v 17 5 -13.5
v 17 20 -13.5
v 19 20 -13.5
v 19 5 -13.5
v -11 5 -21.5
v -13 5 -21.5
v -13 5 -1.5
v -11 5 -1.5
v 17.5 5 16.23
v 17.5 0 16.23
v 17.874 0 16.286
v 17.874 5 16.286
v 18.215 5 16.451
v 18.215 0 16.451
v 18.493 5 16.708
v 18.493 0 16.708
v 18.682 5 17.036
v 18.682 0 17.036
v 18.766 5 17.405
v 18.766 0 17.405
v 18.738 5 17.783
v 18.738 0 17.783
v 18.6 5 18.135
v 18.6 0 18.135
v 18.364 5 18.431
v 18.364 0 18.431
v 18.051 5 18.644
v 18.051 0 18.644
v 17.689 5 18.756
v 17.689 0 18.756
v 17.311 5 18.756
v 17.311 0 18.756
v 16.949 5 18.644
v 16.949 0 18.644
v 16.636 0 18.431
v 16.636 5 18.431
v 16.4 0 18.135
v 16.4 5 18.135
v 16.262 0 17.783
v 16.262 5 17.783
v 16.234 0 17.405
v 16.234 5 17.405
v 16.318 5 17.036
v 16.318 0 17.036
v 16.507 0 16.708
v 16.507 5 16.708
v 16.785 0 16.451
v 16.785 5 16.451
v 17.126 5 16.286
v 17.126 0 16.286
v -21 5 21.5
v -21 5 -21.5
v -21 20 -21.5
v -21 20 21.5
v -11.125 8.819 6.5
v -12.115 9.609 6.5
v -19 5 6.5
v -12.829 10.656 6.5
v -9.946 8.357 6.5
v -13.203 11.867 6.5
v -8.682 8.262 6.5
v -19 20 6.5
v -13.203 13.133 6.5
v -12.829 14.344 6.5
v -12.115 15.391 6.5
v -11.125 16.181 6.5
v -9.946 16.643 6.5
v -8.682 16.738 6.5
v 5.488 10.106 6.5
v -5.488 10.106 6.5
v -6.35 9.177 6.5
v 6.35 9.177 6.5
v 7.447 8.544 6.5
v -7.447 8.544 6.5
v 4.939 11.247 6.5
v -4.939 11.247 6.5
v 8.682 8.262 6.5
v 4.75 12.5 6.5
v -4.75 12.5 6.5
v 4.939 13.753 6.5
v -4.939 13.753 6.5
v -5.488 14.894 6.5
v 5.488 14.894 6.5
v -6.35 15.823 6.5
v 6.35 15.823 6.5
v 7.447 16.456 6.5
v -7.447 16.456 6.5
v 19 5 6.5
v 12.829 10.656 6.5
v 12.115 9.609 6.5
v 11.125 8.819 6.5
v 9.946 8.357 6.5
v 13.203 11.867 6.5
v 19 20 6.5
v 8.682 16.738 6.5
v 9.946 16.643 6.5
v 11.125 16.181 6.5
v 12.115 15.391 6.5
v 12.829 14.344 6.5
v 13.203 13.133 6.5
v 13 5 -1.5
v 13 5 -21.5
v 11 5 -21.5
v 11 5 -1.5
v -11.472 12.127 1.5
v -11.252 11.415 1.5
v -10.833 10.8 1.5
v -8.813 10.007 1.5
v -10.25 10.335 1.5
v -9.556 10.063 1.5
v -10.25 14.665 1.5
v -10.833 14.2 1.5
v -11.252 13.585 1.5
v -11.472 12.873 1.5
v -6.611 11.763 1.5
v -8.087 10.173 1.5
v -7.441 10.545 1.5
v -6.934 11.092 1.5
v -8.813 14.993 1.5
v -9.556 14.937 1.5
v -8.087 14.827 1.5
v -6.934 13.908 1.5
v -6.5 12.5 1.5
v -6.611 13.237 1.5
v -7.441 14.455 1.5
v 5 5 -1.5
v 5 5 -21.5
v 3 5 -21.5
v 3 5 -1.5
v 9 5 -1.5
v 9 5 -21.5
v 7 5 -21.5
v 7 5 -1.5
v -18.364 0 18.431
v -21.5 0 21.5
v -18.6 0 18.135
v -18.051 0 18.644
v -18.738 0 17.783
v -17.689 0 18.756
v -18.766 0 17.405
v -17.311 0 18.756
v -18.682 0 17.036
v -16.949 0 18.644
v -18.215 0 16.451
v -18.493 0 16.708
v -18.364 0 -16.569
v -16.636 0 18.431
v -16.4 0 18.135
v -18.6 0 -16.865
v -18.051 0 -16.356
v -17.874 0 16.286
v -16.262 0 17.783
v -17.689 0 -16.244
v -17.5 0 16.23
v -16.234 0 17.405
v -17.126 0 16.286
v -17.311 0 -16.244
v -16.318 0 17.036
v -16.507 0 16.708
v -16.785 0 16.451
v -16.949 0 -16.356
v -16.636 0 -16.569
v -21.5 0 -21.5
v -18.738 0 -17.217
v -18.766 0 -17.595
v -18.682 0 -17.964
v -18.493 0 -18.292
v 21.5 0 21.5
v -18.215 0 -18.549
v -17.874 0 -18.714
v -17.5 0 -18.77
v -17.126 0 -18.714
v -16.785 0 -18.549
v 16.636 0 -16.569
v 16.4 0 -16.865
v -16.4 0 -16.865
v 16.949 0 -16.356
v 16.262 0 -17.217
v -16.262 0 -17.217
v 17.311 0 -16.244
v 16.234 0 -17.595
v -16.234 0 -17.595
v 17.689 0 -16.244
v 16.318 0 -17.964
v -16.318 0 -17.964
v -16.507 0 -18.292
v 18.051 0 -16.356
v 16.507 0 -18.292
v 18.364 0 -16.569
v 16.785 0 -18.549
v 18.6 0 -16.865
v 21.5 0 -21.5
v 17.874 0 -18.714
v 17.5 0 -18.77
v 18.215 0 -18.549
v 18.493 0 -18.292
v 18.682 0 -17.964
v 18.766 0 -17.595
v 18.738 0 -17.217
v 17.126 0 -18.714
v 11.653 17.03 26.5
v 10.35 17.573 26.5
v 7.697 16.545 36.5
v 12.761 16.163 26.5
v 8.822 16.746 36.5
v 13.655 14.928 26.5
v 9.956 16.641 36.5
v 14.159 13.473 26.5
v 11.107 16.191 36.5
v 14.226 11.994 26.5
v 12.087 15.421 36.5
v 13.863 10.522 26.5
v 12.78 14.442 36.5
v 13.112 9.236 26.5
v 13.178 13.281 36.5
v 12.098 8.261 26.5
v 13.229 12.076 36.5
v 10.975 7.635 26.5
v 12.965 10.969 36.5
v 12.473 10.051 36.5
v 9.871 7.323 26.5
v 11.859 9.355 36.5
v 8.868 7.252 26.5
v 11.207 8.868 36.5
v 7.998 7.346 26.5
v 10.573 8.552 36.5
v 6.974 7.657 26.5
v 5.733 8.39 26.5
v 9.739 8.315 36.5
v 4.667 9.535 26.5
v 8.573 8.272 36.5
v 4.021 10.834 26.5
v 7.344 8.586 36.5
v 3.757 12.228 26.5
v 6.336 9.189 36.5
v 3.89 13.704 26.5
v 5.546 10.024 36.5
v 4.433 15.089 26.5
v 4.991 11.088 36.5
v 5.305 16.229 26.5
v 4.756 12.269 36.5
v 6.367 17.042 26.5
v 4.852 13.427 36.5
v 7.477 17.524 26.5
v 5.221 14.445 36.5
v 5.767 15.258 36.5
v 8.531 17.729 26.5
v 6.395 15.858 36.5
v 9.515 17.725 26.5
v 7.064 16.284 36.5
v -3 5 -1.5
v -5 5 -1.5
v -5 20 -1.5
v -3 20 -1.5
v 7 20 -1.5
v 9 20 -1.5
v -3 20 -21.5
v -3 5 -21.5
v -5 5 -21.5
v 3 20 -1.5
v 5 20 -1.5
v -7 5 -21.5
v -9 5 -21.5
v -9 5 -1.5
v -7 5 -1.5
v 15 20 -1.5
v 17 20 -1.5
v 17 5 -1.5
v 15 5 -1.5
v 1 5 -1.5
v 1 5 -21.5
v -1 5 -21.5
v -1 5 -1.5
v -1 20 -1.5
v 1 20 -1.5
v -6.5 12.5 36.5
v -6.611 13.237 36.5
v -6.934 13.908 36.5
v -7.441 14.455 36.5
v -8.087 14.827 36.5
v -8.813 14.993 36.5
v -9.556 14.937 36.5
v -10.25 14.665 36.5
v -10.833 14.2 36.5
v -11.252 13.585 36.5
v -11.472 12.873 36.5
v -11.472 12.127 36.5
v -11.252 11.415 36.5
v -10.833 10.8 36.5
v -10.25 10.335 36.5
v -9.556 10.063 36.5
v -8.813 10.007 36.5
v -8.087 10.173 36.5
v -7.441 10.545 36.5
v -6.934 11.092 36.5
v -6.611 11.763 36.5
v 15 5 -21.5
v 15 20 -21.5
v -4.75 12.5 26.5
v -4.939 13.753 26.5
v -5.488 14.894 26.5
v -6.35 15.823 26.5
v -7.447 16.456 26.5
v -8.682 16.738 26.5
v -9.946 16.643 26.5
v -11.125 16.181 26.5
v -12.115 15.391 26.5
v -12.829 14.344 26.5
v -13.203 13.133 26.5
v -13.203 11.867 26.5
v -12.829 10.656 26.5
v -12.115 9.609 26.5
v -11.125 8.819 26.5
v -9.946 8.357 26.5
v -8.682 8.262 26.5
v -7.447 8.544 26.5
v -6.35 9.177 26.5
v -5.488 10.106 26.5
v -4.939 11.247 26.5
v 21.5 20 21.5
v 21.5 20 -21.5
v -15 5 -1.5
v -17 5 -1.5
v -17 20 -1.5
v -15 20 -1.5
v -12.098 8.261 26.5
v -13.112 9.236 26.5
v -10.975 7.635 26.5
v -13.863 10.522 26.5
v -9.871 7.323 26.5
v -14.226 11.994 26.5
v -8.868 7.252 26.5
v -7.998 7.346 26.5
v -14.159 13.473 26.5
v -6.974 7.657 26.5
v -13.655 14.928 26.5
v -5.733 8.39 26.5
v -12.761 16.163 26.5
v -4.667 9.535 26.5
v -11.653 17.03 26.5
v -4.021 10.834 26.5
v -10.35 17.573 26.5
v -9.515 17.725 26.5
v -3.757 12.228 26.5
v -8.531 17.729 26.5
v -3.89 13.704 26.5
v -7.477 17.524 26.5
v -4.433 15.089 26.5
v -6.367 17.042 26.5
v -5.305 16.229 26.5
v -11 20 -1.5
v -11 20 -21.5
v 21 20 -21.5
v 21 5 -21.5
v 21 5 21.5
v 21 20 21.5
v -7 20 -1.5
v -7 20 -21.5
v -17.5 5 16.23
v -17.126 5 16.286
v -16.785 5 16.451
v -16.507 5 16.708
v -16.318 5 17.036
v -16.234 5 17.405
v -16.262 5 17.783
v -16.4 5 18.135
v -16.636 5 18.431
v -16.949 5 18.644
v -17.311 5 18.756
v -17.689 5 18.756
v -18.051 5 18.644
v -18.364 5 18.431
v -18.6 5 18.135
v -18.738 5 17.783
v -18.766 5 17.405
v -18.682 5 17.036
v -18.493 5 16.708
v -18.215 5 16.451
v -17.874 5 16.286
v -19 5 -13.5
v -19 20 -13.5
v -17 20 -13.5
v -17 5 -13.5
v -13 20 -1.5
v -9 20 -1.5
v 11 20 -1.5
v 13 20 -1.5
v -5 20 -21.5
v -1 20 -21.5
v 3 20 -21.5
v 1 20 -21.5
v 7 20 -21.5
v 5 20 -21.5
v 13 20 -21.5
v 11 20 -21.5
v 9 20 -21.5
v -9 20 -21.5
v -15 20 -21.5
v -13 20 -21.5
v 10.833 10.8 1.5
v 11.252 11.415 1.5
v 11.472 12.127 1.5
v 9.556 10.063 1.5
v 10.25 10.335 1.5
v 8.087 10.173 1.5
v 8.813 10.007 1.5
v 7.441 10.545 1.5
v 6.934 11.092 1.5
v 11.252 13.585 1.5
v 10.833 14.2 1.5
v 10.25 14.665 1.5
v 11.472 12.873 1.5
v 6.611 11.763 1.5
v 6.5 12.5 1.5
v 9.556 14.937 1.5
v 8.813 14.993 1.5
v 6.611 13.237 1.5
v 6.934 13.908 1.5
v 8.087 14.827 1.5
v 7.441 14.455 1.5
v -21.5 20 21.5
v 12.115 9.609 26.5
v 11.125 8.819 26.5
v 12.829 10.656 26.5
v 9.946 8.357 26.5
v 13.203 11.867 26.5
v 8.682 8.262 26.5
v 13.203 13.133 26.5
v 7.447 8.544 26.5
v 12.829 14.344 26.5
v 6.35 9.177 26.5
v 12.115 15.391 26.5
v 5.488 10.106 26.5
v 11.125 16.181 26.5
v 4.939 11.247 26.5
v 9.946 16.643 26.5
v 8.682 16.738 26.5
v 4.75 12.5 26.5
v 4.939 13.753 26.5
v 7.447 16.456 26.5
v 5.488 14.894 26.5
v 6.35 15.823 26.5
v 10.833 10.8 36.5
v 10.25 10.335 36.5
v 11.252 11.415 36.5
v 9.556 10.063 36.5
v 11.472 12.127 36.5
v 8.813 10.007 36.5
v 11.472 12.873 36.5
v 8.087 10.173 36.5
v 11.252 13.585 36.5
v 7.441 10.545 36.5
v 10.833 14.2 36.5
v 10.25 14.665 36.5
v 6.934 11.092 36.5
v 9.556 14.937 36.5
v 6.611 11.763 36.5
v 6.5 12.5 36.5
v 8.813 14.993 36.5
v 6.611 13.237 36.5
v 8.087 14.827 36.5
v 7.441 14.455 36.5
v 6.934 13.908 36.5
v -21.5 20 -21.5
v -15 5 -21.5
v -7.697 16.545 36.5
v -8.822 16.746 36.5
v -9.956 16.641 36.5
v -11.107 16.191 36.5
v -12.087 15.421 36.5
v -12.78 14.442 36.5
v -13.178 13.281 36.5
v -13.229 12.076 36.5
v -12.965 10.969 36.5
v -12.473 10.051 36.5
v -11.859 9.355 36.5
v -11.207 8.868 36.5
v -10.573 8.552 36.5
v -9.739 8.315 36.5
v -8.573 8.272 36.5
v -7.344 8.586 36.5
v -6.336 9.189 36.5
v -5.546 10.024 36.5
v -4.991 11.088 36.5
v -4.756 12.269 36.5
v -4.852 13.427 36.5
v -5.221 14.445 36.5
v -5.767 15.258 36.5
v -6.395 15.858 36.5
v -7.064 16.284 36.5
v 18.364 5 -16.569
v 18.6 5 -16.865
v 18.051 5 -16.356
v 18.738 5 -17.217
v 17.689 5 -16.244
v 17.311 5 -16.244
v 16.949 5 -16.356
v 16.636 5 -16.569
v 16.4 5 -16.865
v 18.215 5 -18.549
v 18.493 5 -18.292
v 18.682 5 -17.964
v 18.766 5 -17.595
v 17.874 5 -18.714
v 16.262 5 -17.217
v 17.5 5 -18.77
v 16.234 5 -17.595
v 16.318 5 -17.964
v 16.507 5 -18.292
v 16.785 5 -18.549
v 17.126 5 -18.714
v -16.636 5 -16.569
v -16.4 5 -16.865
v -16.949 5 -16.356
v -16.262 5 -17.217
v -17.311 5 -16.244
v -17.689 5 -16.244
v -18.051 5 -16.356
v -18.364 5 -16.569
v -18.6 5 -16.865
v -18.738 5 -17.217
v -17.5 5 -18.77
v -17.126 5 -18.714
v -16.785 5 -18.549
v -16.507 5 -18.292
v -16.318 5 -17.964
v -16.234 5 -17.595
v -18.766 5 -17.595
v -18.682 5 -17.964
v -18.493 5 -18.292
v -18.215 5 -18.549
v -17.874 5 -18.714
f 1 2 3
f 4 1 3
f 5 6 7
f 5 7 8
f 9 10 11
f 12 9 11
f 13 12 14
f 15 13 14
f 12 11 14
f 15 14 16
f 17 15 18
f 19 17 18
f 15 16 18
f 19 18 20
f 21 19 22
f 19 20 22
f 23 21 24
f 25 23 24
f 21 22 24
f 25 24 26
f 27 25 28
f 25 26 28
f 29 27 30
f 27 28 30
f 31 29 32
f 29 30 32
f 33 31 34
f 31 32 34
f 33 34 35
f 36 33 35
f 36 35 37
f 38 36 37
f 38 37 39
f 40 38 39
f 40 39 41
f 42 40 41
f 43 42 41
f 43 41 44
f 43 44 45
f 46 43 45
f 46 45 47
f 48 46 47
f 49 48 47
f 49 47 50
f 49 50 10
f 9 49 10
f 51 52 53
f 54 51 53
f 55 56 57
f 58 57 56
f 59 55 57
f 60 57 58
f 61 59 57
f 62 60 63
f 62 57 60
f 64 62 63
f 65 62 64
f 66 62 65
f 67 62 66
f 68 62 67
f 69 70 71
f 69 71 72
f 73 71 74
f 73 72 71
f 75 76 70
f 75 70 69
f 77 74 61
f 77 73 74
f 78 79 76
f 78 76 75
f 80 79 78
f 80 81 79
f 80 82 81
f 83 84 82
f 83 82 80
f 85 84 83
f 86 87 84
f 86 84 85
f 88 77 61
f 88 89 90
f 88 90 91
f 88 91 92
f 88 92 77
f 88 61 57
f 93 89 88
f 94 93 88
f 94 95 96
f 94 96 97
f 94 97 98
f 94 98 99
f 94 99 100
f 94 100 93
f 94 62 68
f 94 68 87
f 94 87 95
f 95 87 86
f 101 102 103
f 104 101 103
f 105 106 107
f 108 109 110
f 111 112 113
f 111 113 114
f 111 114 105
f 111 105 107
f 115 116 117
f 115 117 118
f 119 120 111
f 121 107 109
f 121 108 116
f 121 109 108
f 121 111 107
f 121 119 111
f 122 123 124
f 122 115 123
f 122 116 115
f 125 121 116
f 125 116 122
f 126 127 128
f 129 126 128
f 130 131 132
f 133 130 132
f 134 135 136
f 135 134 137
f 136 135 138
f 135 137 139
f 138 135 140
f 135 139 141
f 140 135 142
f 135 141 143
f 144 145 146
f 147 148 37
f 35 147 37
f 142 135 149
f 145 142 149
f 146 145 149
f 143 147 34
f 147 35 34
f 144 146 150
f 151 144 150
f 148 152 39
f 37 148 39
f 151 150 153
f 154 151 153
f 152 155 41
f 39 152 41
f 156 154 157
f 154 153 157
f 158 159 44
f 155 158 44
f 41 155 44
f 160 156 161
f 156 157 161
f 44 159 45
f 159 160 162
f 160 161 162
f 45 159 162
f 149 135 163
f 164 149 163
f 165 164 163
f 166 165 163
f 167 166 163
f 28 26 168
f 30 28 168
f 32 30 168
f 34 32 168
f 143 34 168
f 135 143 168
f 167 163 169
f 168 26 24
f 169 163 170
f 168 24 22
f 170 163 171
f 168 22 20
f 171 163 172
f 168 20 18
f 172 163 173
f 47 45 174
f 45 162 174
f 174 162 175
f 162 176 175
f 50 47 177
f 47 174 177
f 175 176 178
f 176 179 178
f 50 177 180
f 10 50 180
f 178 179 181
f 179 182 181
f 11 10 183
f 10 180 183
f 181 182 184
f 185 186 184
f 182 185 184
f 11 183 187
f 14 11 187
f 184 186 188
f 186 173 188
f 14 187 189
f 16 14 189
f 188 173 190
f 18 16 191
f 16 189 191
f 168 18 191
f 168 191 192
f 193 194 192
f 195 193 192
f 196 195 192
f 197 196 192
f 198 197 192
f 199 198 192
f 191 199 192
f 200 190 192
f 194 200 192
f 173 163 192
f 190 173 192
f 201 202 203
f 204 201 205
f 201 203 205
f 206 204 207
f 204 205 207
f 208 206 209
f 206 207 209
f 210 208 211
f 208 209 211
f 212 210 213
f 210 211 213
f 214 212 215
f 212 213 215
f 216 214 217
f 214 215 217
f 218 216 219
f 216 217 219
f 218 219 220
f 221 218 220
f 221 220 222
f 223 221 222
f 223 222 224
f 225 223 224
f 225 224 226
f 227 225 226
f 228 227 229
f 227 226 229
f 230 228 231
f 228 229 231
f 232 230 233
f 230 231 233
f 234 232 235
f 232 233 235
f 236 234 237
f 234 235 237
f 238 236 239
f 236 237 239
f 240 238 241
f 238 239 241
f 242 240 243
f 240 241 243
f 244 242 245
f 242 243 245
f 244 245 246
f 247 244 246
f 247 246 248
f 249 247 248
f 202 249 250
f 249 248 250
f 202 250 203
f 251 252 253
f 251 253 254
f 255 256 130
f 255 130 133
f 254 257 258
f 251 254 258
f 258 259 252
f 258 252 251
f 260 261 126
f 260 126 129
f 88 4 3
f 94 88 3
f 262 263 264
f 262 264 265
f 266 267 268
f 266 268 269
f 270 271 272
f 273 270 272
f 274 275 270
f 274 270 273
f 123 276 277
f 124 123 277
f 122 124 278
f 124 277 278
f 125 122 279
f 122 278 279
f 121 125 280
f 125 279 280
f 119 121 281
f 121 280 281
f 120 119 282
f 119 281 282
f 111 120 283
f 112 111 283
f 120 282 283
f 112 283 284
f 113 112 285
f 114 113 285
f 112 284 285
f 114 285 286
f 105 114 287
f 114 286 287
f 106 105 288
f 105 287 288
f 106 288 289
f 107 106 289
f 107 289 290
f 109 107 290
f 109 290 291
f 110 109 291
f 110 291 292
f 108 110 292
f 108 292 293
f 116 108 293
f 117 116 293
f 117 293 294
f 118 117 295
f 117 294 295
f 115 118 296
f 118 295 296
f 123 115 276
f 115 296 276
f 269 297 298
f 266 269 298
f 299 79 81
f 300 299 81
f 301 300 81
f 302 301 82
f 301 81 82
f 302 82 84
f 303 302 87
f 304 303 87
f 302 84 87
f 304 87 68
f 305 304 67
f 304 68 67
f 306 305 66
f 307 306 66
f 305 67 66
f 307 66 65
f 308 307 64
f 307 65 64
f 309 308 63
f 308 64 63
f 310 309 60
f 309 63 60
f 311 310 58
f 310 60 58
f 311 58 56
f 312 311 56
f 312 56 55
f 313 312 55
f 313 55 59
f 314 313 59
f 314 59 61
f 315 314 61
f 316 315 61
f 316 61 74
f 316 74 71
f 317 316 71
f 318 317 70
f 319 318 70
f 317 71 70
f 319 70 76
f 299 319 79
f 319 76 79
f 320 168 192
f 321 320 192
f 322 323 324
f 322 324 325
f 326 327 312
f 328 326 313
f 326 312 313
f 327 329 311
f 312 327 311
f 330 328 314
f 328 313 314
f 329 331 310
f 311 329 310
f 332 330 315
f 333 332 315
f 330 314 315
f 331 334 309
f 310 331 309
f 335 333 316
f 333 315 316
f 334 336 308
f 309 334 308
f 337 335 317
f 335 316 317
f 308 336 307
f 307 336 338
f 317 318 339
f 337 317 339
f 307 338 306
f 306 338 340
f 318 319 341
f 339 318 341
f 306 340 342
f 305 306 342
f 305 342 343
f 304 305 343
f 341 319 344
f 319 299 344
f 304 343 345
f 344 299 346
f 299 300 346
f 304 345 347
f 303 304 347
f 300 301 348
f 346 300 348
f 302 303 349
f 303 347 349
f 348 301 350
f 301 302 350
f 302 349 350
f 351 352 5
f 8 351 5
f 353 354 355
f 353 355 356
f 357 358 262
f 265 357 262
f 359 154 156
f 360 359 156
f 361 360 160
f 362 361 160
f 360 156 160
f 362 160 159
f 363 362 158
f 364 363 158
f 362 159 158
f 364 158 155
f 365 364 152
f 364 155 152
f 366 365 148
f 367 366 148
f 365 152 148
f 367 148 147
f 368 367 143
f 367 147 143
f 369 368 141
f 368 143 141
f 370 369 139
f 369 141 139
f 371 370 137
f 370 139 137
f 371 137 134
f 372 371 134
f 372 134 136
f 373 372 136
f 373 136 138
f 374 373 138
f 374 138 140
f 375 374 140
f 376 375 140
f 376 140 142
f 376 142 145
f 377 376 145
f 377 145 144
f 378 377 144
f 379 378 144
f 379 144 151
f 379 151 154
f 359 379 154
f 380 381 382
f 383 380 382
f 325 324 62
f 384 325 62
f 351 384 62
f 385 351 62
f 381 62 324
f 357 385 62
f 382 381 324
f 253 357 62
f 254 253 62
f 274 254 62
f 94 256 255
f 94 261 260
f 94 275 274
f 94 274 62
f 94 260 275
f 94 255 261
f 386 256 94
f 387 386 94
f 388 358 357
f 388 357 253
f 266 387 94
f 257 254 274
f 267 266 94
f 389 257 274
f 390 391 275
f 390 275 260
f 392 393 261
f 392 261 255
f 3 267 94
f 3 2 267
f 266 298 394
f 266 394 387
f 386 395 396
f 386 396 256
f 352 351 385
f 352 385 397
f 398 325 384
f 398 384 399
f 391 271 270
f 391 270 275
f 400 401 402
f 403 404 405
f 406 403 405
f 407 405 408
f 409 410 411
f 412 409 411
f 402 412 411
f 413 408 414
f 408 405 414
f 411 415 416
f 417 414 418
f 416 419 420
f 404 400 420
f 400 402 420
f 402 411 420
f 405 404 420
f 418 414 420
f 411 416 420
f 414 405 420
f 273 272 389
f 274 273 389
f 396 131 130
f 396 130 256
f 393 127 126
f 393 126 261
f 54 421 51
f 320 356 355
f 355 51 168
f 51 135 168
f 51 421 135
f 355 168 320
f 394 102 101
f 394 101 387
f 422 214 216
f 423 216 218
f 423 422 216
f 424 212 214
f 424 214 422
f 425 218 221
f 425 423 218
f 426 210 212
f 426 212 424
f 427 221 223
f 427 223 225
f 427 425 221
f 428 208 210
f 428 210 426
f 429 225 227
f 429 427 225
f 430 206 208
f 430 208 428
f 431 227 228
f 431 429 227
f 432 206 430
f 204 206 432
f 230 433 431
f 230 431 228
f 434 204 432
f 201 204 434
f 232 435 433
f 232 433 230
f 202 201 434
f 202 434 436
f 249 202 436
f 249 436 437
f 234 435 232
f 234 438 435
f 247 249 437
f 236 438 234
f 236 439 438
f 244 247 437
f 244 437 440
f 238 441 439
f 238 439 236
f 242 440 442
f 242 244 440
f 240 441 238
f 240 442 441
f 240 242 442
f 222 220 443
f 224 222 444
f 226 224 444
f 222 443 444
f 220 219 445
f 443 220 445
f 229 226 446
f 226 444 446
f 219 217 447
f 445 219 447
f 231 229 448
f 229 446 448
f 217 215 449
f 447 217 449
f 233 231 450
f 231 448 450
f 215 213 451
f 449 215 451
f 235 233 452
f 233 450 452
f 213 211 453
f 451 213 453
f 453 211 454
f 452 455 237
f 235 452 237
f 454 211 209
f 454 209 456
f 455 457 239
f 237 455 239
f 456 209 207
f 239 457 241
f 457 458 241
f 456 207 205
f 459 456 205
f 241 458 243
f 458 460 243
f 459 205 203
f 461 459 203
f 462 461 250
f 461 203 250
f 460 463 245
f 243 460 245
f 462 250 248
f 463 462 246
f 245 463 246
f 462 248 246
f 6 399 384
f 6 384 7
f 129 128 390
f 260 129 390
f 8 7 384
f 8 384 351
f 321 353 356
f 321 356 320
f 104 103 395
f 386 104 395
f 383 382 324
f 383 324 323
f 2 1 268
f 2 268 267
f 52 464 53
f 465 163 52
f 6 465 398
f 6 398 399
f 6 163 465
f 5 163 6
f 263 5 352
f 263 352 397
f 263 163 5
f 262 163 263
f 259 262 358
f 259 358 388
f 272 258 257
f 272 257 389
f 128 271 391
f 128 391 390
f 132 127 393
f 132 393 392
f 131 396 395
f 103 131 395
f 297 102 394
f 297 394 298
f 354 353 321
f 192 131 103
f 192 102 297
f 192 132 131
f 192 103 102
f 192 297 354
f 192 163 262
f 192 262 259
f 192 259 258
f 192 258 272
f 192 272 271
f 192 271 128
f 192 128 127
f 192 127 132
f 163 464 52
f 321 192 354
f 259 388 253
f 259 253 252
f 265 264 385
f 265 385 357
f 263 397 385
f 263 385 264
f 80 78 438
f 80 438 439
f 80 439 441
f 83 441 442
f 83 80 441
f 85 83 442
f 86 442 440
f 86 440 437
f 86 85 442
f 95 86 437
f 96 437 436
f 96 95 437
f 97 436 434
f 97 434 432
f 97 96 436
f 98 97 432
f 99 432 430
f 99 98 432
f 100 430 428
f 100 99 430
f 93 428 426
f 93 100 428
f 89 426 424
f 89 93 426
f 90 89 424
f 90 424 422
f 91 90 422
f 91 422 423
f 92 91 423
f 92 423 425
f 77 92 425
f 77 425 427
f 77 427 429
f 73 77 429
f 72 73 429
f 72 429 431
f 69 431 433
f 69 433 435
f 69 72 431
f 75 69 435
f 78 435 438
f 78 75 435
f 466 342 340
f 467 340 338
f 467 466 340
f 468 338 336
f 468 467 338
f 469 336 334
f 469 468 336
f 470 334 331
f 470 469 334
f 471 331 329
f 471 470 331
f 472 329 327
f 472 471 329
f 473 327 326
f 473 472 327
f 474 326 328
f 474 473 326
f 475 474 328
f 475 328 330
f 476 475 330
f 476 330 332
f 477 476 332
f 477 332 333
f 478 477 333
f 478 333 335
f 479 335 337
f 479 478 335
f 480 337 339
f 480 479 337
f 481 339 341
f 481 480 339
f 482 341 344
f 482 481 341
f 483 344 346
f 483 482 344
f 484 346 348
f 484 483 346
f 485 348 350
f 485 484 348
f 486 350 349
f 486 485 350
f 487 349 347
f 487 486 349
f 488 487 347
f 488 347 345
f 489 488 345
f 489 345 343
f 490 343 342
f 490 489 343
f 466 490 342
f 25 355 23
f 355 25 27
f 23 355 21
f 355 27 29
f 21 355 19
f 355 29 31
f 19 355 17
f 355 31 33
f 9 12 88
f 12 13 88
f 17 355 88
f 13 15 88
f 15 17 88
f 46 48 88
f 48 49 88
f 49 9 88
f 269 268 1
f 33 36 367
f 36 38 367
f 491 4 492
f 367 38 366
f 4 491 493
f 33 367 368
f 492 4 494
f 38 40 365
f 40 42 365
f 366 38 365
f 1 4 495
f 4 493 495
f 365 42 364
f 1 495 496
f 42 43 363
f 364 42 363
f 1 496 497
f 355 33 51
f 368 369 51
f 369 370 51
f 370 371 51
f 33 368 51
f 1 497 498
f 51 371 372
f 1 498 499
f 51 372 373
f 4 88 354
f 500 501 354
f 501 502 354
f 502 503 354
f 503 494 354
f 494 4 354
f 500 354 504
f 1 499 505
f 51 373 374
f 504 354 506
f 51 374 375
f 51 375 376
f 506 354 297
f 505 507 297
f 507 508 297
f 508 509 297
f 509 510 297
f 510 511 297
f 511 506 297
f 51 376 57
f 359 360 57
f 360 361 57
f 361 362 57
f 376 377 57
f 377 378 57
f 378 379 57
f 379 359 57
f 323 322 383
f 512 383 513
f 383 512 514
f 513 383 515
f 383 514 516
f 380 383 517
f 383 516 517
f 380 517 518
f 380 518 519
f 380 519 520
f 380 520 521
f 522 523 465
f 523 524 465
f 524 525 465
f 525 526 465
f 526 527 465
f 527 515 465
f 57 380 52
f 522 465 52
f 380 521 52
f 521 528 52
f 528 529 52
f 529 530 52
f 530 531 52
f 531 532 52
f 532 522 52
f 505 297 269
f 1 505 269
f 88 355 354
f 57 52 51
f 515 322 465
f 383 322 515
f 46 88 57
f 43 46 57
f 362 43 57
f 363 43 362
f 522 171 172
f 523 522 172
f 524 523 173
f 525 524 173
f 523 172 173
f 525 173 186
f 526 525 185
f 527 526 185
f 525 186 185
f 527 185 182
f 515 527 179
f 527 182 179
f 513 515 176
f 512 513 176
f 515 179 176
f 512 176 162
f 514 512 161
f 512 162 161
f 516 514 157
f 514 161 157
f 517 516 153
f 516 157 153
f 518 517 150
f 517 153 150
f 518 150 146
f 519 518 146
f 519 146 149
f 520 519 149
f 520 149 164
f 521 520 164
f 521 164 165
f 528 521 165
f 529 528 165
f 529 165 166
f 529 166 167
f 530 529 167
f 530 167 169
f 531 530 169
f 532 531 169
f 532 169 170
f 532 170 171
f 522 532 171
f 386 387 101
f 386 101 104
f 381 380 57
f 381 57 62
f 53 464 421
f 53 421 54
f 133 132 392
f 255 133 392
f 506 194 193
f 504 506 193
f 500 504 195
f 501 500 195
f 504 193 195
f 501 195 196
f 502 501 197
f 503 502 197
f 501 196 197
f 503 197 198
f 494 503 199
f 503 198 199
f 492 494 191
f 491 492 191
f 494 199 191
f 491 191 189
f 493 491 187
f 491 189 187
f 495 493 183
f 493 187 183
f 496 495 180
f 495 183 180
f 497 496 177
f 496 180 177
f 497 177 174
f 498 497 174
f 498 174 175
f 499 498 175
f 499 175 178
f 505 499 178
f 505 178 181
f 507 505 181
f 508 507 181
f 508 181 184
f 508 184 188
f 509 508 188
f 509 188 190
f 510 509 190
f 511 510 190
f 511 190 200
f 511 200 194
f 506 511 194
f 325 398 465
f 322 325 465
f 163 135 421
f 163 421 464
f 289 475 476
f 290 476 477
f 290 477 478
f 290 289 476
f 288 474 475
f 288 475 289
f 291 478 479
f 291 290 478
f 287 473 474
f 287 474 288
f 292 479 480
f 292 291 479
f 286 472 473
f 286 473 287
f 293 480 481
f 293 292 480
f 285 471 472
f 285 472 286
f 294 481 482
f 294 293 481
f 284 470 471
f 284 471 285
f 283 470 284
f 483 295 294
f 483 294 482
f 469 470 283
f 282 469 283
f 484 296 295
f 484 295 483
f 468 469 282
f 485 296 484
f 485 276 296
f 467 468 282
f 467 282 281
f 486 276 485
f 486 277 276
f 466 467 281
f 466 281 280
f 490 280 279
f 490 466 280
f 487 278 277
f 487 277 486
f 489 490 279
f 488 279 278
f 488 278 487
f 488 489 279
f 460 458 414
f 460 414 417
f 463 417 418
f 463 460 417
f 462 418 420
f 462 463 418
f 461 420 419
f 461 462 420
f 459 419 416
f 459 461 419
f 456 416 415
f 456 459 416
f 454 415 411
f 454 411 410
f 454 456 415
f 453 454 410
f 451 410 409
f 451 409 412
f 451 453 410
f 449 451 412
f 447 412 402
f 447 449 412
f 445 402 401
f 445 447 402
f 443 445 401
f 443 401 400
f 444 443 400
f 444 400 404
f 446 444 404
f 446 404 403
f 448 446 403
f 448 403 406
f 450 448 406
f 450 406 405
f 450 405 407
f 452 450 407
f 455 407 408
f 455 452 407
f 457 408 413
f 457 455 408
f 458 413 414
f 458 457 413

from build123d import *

# Parameters (mm, degrees)
SKETCH1_W               = 43
SKETCH1_H               = 43
BOSS_EXTRUDE1_DEPTH     = 20
SKETCH2_W               = 2
SKETCH2_H               = 15
CUT_EXTRUDE1_DEPTH      = 20
LPATTERN1_COUNT         = 6
LPATTERN1_PITCH         = 4
MIRROR1_COPY_1_SKETCH_W = 2
MIRROR1_COPY_1_SKETCH_H = 15
MIRROR1_COPY_1_DEPTH    = 20
MIRROR1_COPY_2_SKETCH_W = 2
MIRROR1_COPY_2_SKETCH_H = 15
MIRROR1_COPY_2_DEPTH    = 20
MIRROR1_COPY_3_SKETCH_W = 2
MIRROR1_COPY_3_SKETCH_H = 15
MIRROR1_COPY_3_DEPTH    = 20
MIRROR1_COPY_4_SKETCH_W = 2
MIRROR1_COPY_4_SKETCH_H = 15
MIRROR1_COPY_4_DEPTH    = 20
MIRROR1_COPY_5_SKETCH_W = 2
MIRROR1_COPY_5_SKETCH_H = 15
MIRROR1_COPY_5_DEPTH    = 20
MIRROR1_COPY_6_SKETCH_W = 2
MIRROR1_COPY_6_SKETCH_H = 15
MIRROR1_COPY_6_DEPTH    = 20
SKETCH7_W               = 2
SKETCH7_H               = 15
CUT_EXTRUDE6_DEPTH      = 38.299463803
SKETCH8_W               = 38
SKETCH8_H               = 15
CUT_EXTRUDE7_DEPTH      = 15
SKETCH9_R               = 4.25
BOSS_EXTRUDE2_DEPTH     = 20
SKETCH12_R              = 2.5
CUT_EXTRUDE8_DEPTH      = 35
SKETCH13_R              = 1.27
CUT_EXTRUDE9_DEPTH      = 47.845490789
SKETCH14_W              = 2
SKETCH14_H              = 8
CUT_EXTRUDE10_DEPTH     = 15


with BuildPart() as part:
    # Sketch1 → Boss-Extrude1 (new body)
    with BuildSketch(Plane(origin=(0, 0, 0), x_dir=(1, 0, 0), z_dir=(0, 1, 0))):
        Rectangle(SKETCH1_W, SKETCH1_H)
    extrude(amount=BOSS_EXTRUDE1_DEPTH)

    # Sketch2 → Cut-Extrude1 (cut)
    with BuildSketch(Plane(origin=(0, 0, -21.5), x_dir=(-1, 0, 0), z_dir=(0, 0, -1))):
        with Locations((0, 12.5)):
            Rectangle(SKETCH2_W, SKETCH2_H)
    cut_extrude1 = extrude(amount=-CUT_EXTRUDE1_DEPTH, mode=Mode.SUBTRACT)

    # LPattern1: Cut-Extrude1 ×6
    with Locations(*[(i * LPATTERN1_PITCH, 0, 0) for i in range(1, LPATTERN1_COUNT)]):
        add(cut_extrude1, mode=Mode.SUBTRACT)

    # Mirror1 copy 1 sketch → Mirror1 copy 1 (cut)
    with BuildSketch(Plane(origin=(-4, 0, -21.5), x_dir=(1, 0, 0), z_dir=(0, 0, -1))):
        with Locations((0, -12.5)):
            Rectangle(MIRROR1_COPY_1_SKETCH_W, MIRROR1_COPY_1_SKETCH_H)
    extrude(amount=-MIRROR1_COPY_1_DEPTH, mode=Mode.SUBTRACT)

    # Mirror1 copy 2 sketch → Mirror1 copy 2 (cut)
    with BuildSketch(Plane(origin=(-8, 0, -21.5), x_dir=(1, 0, 0), z_dir=(0, 0, -1))):
        with Locations((0, -12.5)):
            Rectangle(MIRROR1_COPY_2_SKETCH_W, MIRROR1_COPY_2_SKETCH_H)
    extrude(amount=-MIRROR1_COPY_2_DEPTH, mode=Mode.SUBTRACT)

    # Mirror1 copy 3 sketch → Mirror1 copy 3 (cut)
    with BuildSketch(Plane(origin=(-12, 0, -21.5), x_dir=(1, 0, 0), z_dir=(0, 0, -1))):
        with Locations((0, -12.5)):
            Rectangle(MIRROR1_COPY_3_SKETCH_W, MIRROR1_COPY_3_SKETCH_H)
    extrude(amount=-MIRROR1_COPY_3_DEPTH, mode=Mode.SUBTRACT)

    # Mirror1 copy 4 sketch → Mirror1 copy 4 (cut)
    with BuildSketch(Plane(origin=(-16, 0, -21.5), x_dir=(1, 0, 0), z_dir=(0, 0, -1))):
        with Locations((0, -12.5)):
            Rectangle(MIRROR1_COPY_4_SKETCH_W, MIRROR1_COPY_4_SKETCH_H)
    extrude(amount=-MIRROR1_COPY_4_DEPTH, mode=Mode.SUBTRACT)

    # Mirror1 copy 5 sketch → Mirror1 copy 5 (cut)
    with BuildSketch(Plane(origin=(-20, 0, -21.5), x_dir=(1, 0, 0), z_dir=(0, 0, -1))):
        with Locations((0, -12.5)):
            Rectangle(MIRROR1_COPY_5_SKETCH_W, MIRROR1_COPY_5_SKETCH_H)
    extrude(amount=-MIRROR1_COPY_5_DEPTH, mode=Mode.SUBTRACT)

    # Mirror1 copy 6 sketch → Mirror1 copy 6 (cut)
    with BuildSketch(Plane(origin=(0, 0, -21.5), x_dir=(1, 0, 0), z_dir=(0, 0, -1))):
        with Locations((0, -12.5)):
            Rectangle(MIRROR1_COPY_6_SKETCH_W, MIRROR1_COPY_6_SKETCH_H)
    extrude(amount=-MIRROR1_COPY_6_DEPTH, mode=Mode.SUBTRACT)

    # Sketch7 → Cut-Extrude6 (cut, through all)
    with BuildSketch(Plane(origin=(0, 0, -1.5), x_dir=(-1, 0, 0), z_dir=(0, 0, -1))):
        with Locations((20, 12.5)):
            Rectangle(SKETCH7_W, SKETCH7_H)
        with Locations((-20, 12.5)):
            Rectangle(SKETCH7_W, SKETCH7_H)
    extrude(amount=-CUT_EXTRUDE6_DEPTH, mode=Mode.SUBTRACT)

    # Sketch8 → Cut-Extrude7 (cut)
    with BuildSketch(Plane.XY.offset(21.5)):
        with Locations((0, 12.5)):
            Rectangle(SKETCH8_W, SKETCH8_H)
    extrude(amount=-CUT_EXTRUDE7_DEPTH, mode=Mode.SUBTRACT)

    # Sketch9 → Boss-Extrude2 (add)
    with BuildSketch(Plane.XY.offset(6.5)):
        with Locations((-9, 12.5)):
            Circle(SKETCH9_R)
    boss_extrude2 = extrude(amount=BOSS_EXTRUDE2_DEPTH)

    # Loft1: read off the stored shape, not the designer's step
    # Loft1: loft between two sections, ruled curve by curve
    loft1_from = [
        Edge.make_bspline([(-10.350301356, 17.57338016, 26.5), (-20.497061676, 14.872777448, 26.5), (-17.796458964, 4.726017128, 26.5), (-7.649698644, 7.42661984, 26.5), (2.497061676, 10.127222552, 26.5), (-0.203541036, 20.273982872, 26.5), (-10.350301356, 17.57338016, 26.5)], [0, 0, 0, 0, 0.5, 0.5, 0.5, 1, 1, 1, 1], 3, [1, 0.333333333, 0.333333333, 1, 0.333333333, 0.333333333, 1]),
    ]
    loft1_to = [
        Edge.make_bspline([(-7.69684054, 16.545278164, 36.5), (-15.787396868, 19.151597083, 36.5), (-18.393715787, 11.061040755, 36.5), (-10.30315946, 8.454721836, 36.5), (-2.212603132, 5.848402917, 36.5), (0.393715787, 13.938959245, 36.5), (-7.69684054, 16.545278164, 36.5)], [0, 0, 0, 0, 0.5, 0.5, 0.5, 1, 1, 1, 1], 3, [1, 0.333333333, 0.333333333, 1, 0.333333333, 0.333333333, 1]),
    ]
    loft1 = Solid(Shell([*[Face.make_surface_from_curves(loft1_from[k], loft1_to[k]) for k in range(1)], Face(Wire(loft1_from)), Face(Wire(loft1_to))]))
    add(loft1)

    # Sketch12 → Cut-Extrude8 (cut)
    with BuildSketch(Plane.XY.offset(36.5)):
        with Locations((-9, 12.5)):
            Circle(SKETCH12_R)
    cut_extrude8 = extrude(amount=-CUT_EXTRUDE8_DEPTH, mode=Mode.SUBTRACT)

    # Mirror3: Boss-Extrude2, Loft1, Cut-Extrude8 across plane
    add(boss_extrude2.mirror(Plane(origin=(0, 0, 0), x_dir=(0, 0, 1), z_dir=(1, 0, 0))))
    add(loft1.mirror(Plane(origin=(0, 0, 0), x_dir=(0, 0, 1), z_dir=(1, 0, 0))))
    add(cut_extrude8.mirror(Plane(origin=(0, 0, 0), x_dir=(0, 0, 1), z_dir=(1, 0, 0))), mode=Mode.SUBTRACT)

    # Sketch13 → Cut-Extrude9 (cut, through all)
    with BuildSketch(Plane.XZ):
        with Locations(Location((17.5, 17.5, 0), (0, 0, 270))):
            Circle(SKETCH13_R)
        with Locations(Location((-17.5, 17.5, 0), (0, 0, 270))):
            Circle(SKETCH13_R)
        with Locations(Location((-17.5, -17.5, 0), (0, 0, 270))):
            Circle(SKETCH13_R)
        with Locations(Location((17.5, -17.5, 0), (0, 0, 270))):
            Circle(SKETCH13_R)
    extrude(amount=-CUT_EXTRUDE9_DEPTH, mode=Mode.SUBTRACT)

    # Sketch14 → Cut-Extrude10 (cut)
    with BuildSketch(Plane(origin=(0, 20, 0), x_dir=(1, 0, 0), z_dir=(0, 1, 0))):
        with Locations((-18, 17.5)):
            Rectangle(SKETCH14_W, SKETCH14_H)
        with Locations((18, 17.5)):
            Rectangle(SKETCH14_W, SKETCH14_H)
    extrude(amount=-CUT_EXTRUDE10_DEPTH, mode=Mode.SUBTRACT)


solid = part.part
